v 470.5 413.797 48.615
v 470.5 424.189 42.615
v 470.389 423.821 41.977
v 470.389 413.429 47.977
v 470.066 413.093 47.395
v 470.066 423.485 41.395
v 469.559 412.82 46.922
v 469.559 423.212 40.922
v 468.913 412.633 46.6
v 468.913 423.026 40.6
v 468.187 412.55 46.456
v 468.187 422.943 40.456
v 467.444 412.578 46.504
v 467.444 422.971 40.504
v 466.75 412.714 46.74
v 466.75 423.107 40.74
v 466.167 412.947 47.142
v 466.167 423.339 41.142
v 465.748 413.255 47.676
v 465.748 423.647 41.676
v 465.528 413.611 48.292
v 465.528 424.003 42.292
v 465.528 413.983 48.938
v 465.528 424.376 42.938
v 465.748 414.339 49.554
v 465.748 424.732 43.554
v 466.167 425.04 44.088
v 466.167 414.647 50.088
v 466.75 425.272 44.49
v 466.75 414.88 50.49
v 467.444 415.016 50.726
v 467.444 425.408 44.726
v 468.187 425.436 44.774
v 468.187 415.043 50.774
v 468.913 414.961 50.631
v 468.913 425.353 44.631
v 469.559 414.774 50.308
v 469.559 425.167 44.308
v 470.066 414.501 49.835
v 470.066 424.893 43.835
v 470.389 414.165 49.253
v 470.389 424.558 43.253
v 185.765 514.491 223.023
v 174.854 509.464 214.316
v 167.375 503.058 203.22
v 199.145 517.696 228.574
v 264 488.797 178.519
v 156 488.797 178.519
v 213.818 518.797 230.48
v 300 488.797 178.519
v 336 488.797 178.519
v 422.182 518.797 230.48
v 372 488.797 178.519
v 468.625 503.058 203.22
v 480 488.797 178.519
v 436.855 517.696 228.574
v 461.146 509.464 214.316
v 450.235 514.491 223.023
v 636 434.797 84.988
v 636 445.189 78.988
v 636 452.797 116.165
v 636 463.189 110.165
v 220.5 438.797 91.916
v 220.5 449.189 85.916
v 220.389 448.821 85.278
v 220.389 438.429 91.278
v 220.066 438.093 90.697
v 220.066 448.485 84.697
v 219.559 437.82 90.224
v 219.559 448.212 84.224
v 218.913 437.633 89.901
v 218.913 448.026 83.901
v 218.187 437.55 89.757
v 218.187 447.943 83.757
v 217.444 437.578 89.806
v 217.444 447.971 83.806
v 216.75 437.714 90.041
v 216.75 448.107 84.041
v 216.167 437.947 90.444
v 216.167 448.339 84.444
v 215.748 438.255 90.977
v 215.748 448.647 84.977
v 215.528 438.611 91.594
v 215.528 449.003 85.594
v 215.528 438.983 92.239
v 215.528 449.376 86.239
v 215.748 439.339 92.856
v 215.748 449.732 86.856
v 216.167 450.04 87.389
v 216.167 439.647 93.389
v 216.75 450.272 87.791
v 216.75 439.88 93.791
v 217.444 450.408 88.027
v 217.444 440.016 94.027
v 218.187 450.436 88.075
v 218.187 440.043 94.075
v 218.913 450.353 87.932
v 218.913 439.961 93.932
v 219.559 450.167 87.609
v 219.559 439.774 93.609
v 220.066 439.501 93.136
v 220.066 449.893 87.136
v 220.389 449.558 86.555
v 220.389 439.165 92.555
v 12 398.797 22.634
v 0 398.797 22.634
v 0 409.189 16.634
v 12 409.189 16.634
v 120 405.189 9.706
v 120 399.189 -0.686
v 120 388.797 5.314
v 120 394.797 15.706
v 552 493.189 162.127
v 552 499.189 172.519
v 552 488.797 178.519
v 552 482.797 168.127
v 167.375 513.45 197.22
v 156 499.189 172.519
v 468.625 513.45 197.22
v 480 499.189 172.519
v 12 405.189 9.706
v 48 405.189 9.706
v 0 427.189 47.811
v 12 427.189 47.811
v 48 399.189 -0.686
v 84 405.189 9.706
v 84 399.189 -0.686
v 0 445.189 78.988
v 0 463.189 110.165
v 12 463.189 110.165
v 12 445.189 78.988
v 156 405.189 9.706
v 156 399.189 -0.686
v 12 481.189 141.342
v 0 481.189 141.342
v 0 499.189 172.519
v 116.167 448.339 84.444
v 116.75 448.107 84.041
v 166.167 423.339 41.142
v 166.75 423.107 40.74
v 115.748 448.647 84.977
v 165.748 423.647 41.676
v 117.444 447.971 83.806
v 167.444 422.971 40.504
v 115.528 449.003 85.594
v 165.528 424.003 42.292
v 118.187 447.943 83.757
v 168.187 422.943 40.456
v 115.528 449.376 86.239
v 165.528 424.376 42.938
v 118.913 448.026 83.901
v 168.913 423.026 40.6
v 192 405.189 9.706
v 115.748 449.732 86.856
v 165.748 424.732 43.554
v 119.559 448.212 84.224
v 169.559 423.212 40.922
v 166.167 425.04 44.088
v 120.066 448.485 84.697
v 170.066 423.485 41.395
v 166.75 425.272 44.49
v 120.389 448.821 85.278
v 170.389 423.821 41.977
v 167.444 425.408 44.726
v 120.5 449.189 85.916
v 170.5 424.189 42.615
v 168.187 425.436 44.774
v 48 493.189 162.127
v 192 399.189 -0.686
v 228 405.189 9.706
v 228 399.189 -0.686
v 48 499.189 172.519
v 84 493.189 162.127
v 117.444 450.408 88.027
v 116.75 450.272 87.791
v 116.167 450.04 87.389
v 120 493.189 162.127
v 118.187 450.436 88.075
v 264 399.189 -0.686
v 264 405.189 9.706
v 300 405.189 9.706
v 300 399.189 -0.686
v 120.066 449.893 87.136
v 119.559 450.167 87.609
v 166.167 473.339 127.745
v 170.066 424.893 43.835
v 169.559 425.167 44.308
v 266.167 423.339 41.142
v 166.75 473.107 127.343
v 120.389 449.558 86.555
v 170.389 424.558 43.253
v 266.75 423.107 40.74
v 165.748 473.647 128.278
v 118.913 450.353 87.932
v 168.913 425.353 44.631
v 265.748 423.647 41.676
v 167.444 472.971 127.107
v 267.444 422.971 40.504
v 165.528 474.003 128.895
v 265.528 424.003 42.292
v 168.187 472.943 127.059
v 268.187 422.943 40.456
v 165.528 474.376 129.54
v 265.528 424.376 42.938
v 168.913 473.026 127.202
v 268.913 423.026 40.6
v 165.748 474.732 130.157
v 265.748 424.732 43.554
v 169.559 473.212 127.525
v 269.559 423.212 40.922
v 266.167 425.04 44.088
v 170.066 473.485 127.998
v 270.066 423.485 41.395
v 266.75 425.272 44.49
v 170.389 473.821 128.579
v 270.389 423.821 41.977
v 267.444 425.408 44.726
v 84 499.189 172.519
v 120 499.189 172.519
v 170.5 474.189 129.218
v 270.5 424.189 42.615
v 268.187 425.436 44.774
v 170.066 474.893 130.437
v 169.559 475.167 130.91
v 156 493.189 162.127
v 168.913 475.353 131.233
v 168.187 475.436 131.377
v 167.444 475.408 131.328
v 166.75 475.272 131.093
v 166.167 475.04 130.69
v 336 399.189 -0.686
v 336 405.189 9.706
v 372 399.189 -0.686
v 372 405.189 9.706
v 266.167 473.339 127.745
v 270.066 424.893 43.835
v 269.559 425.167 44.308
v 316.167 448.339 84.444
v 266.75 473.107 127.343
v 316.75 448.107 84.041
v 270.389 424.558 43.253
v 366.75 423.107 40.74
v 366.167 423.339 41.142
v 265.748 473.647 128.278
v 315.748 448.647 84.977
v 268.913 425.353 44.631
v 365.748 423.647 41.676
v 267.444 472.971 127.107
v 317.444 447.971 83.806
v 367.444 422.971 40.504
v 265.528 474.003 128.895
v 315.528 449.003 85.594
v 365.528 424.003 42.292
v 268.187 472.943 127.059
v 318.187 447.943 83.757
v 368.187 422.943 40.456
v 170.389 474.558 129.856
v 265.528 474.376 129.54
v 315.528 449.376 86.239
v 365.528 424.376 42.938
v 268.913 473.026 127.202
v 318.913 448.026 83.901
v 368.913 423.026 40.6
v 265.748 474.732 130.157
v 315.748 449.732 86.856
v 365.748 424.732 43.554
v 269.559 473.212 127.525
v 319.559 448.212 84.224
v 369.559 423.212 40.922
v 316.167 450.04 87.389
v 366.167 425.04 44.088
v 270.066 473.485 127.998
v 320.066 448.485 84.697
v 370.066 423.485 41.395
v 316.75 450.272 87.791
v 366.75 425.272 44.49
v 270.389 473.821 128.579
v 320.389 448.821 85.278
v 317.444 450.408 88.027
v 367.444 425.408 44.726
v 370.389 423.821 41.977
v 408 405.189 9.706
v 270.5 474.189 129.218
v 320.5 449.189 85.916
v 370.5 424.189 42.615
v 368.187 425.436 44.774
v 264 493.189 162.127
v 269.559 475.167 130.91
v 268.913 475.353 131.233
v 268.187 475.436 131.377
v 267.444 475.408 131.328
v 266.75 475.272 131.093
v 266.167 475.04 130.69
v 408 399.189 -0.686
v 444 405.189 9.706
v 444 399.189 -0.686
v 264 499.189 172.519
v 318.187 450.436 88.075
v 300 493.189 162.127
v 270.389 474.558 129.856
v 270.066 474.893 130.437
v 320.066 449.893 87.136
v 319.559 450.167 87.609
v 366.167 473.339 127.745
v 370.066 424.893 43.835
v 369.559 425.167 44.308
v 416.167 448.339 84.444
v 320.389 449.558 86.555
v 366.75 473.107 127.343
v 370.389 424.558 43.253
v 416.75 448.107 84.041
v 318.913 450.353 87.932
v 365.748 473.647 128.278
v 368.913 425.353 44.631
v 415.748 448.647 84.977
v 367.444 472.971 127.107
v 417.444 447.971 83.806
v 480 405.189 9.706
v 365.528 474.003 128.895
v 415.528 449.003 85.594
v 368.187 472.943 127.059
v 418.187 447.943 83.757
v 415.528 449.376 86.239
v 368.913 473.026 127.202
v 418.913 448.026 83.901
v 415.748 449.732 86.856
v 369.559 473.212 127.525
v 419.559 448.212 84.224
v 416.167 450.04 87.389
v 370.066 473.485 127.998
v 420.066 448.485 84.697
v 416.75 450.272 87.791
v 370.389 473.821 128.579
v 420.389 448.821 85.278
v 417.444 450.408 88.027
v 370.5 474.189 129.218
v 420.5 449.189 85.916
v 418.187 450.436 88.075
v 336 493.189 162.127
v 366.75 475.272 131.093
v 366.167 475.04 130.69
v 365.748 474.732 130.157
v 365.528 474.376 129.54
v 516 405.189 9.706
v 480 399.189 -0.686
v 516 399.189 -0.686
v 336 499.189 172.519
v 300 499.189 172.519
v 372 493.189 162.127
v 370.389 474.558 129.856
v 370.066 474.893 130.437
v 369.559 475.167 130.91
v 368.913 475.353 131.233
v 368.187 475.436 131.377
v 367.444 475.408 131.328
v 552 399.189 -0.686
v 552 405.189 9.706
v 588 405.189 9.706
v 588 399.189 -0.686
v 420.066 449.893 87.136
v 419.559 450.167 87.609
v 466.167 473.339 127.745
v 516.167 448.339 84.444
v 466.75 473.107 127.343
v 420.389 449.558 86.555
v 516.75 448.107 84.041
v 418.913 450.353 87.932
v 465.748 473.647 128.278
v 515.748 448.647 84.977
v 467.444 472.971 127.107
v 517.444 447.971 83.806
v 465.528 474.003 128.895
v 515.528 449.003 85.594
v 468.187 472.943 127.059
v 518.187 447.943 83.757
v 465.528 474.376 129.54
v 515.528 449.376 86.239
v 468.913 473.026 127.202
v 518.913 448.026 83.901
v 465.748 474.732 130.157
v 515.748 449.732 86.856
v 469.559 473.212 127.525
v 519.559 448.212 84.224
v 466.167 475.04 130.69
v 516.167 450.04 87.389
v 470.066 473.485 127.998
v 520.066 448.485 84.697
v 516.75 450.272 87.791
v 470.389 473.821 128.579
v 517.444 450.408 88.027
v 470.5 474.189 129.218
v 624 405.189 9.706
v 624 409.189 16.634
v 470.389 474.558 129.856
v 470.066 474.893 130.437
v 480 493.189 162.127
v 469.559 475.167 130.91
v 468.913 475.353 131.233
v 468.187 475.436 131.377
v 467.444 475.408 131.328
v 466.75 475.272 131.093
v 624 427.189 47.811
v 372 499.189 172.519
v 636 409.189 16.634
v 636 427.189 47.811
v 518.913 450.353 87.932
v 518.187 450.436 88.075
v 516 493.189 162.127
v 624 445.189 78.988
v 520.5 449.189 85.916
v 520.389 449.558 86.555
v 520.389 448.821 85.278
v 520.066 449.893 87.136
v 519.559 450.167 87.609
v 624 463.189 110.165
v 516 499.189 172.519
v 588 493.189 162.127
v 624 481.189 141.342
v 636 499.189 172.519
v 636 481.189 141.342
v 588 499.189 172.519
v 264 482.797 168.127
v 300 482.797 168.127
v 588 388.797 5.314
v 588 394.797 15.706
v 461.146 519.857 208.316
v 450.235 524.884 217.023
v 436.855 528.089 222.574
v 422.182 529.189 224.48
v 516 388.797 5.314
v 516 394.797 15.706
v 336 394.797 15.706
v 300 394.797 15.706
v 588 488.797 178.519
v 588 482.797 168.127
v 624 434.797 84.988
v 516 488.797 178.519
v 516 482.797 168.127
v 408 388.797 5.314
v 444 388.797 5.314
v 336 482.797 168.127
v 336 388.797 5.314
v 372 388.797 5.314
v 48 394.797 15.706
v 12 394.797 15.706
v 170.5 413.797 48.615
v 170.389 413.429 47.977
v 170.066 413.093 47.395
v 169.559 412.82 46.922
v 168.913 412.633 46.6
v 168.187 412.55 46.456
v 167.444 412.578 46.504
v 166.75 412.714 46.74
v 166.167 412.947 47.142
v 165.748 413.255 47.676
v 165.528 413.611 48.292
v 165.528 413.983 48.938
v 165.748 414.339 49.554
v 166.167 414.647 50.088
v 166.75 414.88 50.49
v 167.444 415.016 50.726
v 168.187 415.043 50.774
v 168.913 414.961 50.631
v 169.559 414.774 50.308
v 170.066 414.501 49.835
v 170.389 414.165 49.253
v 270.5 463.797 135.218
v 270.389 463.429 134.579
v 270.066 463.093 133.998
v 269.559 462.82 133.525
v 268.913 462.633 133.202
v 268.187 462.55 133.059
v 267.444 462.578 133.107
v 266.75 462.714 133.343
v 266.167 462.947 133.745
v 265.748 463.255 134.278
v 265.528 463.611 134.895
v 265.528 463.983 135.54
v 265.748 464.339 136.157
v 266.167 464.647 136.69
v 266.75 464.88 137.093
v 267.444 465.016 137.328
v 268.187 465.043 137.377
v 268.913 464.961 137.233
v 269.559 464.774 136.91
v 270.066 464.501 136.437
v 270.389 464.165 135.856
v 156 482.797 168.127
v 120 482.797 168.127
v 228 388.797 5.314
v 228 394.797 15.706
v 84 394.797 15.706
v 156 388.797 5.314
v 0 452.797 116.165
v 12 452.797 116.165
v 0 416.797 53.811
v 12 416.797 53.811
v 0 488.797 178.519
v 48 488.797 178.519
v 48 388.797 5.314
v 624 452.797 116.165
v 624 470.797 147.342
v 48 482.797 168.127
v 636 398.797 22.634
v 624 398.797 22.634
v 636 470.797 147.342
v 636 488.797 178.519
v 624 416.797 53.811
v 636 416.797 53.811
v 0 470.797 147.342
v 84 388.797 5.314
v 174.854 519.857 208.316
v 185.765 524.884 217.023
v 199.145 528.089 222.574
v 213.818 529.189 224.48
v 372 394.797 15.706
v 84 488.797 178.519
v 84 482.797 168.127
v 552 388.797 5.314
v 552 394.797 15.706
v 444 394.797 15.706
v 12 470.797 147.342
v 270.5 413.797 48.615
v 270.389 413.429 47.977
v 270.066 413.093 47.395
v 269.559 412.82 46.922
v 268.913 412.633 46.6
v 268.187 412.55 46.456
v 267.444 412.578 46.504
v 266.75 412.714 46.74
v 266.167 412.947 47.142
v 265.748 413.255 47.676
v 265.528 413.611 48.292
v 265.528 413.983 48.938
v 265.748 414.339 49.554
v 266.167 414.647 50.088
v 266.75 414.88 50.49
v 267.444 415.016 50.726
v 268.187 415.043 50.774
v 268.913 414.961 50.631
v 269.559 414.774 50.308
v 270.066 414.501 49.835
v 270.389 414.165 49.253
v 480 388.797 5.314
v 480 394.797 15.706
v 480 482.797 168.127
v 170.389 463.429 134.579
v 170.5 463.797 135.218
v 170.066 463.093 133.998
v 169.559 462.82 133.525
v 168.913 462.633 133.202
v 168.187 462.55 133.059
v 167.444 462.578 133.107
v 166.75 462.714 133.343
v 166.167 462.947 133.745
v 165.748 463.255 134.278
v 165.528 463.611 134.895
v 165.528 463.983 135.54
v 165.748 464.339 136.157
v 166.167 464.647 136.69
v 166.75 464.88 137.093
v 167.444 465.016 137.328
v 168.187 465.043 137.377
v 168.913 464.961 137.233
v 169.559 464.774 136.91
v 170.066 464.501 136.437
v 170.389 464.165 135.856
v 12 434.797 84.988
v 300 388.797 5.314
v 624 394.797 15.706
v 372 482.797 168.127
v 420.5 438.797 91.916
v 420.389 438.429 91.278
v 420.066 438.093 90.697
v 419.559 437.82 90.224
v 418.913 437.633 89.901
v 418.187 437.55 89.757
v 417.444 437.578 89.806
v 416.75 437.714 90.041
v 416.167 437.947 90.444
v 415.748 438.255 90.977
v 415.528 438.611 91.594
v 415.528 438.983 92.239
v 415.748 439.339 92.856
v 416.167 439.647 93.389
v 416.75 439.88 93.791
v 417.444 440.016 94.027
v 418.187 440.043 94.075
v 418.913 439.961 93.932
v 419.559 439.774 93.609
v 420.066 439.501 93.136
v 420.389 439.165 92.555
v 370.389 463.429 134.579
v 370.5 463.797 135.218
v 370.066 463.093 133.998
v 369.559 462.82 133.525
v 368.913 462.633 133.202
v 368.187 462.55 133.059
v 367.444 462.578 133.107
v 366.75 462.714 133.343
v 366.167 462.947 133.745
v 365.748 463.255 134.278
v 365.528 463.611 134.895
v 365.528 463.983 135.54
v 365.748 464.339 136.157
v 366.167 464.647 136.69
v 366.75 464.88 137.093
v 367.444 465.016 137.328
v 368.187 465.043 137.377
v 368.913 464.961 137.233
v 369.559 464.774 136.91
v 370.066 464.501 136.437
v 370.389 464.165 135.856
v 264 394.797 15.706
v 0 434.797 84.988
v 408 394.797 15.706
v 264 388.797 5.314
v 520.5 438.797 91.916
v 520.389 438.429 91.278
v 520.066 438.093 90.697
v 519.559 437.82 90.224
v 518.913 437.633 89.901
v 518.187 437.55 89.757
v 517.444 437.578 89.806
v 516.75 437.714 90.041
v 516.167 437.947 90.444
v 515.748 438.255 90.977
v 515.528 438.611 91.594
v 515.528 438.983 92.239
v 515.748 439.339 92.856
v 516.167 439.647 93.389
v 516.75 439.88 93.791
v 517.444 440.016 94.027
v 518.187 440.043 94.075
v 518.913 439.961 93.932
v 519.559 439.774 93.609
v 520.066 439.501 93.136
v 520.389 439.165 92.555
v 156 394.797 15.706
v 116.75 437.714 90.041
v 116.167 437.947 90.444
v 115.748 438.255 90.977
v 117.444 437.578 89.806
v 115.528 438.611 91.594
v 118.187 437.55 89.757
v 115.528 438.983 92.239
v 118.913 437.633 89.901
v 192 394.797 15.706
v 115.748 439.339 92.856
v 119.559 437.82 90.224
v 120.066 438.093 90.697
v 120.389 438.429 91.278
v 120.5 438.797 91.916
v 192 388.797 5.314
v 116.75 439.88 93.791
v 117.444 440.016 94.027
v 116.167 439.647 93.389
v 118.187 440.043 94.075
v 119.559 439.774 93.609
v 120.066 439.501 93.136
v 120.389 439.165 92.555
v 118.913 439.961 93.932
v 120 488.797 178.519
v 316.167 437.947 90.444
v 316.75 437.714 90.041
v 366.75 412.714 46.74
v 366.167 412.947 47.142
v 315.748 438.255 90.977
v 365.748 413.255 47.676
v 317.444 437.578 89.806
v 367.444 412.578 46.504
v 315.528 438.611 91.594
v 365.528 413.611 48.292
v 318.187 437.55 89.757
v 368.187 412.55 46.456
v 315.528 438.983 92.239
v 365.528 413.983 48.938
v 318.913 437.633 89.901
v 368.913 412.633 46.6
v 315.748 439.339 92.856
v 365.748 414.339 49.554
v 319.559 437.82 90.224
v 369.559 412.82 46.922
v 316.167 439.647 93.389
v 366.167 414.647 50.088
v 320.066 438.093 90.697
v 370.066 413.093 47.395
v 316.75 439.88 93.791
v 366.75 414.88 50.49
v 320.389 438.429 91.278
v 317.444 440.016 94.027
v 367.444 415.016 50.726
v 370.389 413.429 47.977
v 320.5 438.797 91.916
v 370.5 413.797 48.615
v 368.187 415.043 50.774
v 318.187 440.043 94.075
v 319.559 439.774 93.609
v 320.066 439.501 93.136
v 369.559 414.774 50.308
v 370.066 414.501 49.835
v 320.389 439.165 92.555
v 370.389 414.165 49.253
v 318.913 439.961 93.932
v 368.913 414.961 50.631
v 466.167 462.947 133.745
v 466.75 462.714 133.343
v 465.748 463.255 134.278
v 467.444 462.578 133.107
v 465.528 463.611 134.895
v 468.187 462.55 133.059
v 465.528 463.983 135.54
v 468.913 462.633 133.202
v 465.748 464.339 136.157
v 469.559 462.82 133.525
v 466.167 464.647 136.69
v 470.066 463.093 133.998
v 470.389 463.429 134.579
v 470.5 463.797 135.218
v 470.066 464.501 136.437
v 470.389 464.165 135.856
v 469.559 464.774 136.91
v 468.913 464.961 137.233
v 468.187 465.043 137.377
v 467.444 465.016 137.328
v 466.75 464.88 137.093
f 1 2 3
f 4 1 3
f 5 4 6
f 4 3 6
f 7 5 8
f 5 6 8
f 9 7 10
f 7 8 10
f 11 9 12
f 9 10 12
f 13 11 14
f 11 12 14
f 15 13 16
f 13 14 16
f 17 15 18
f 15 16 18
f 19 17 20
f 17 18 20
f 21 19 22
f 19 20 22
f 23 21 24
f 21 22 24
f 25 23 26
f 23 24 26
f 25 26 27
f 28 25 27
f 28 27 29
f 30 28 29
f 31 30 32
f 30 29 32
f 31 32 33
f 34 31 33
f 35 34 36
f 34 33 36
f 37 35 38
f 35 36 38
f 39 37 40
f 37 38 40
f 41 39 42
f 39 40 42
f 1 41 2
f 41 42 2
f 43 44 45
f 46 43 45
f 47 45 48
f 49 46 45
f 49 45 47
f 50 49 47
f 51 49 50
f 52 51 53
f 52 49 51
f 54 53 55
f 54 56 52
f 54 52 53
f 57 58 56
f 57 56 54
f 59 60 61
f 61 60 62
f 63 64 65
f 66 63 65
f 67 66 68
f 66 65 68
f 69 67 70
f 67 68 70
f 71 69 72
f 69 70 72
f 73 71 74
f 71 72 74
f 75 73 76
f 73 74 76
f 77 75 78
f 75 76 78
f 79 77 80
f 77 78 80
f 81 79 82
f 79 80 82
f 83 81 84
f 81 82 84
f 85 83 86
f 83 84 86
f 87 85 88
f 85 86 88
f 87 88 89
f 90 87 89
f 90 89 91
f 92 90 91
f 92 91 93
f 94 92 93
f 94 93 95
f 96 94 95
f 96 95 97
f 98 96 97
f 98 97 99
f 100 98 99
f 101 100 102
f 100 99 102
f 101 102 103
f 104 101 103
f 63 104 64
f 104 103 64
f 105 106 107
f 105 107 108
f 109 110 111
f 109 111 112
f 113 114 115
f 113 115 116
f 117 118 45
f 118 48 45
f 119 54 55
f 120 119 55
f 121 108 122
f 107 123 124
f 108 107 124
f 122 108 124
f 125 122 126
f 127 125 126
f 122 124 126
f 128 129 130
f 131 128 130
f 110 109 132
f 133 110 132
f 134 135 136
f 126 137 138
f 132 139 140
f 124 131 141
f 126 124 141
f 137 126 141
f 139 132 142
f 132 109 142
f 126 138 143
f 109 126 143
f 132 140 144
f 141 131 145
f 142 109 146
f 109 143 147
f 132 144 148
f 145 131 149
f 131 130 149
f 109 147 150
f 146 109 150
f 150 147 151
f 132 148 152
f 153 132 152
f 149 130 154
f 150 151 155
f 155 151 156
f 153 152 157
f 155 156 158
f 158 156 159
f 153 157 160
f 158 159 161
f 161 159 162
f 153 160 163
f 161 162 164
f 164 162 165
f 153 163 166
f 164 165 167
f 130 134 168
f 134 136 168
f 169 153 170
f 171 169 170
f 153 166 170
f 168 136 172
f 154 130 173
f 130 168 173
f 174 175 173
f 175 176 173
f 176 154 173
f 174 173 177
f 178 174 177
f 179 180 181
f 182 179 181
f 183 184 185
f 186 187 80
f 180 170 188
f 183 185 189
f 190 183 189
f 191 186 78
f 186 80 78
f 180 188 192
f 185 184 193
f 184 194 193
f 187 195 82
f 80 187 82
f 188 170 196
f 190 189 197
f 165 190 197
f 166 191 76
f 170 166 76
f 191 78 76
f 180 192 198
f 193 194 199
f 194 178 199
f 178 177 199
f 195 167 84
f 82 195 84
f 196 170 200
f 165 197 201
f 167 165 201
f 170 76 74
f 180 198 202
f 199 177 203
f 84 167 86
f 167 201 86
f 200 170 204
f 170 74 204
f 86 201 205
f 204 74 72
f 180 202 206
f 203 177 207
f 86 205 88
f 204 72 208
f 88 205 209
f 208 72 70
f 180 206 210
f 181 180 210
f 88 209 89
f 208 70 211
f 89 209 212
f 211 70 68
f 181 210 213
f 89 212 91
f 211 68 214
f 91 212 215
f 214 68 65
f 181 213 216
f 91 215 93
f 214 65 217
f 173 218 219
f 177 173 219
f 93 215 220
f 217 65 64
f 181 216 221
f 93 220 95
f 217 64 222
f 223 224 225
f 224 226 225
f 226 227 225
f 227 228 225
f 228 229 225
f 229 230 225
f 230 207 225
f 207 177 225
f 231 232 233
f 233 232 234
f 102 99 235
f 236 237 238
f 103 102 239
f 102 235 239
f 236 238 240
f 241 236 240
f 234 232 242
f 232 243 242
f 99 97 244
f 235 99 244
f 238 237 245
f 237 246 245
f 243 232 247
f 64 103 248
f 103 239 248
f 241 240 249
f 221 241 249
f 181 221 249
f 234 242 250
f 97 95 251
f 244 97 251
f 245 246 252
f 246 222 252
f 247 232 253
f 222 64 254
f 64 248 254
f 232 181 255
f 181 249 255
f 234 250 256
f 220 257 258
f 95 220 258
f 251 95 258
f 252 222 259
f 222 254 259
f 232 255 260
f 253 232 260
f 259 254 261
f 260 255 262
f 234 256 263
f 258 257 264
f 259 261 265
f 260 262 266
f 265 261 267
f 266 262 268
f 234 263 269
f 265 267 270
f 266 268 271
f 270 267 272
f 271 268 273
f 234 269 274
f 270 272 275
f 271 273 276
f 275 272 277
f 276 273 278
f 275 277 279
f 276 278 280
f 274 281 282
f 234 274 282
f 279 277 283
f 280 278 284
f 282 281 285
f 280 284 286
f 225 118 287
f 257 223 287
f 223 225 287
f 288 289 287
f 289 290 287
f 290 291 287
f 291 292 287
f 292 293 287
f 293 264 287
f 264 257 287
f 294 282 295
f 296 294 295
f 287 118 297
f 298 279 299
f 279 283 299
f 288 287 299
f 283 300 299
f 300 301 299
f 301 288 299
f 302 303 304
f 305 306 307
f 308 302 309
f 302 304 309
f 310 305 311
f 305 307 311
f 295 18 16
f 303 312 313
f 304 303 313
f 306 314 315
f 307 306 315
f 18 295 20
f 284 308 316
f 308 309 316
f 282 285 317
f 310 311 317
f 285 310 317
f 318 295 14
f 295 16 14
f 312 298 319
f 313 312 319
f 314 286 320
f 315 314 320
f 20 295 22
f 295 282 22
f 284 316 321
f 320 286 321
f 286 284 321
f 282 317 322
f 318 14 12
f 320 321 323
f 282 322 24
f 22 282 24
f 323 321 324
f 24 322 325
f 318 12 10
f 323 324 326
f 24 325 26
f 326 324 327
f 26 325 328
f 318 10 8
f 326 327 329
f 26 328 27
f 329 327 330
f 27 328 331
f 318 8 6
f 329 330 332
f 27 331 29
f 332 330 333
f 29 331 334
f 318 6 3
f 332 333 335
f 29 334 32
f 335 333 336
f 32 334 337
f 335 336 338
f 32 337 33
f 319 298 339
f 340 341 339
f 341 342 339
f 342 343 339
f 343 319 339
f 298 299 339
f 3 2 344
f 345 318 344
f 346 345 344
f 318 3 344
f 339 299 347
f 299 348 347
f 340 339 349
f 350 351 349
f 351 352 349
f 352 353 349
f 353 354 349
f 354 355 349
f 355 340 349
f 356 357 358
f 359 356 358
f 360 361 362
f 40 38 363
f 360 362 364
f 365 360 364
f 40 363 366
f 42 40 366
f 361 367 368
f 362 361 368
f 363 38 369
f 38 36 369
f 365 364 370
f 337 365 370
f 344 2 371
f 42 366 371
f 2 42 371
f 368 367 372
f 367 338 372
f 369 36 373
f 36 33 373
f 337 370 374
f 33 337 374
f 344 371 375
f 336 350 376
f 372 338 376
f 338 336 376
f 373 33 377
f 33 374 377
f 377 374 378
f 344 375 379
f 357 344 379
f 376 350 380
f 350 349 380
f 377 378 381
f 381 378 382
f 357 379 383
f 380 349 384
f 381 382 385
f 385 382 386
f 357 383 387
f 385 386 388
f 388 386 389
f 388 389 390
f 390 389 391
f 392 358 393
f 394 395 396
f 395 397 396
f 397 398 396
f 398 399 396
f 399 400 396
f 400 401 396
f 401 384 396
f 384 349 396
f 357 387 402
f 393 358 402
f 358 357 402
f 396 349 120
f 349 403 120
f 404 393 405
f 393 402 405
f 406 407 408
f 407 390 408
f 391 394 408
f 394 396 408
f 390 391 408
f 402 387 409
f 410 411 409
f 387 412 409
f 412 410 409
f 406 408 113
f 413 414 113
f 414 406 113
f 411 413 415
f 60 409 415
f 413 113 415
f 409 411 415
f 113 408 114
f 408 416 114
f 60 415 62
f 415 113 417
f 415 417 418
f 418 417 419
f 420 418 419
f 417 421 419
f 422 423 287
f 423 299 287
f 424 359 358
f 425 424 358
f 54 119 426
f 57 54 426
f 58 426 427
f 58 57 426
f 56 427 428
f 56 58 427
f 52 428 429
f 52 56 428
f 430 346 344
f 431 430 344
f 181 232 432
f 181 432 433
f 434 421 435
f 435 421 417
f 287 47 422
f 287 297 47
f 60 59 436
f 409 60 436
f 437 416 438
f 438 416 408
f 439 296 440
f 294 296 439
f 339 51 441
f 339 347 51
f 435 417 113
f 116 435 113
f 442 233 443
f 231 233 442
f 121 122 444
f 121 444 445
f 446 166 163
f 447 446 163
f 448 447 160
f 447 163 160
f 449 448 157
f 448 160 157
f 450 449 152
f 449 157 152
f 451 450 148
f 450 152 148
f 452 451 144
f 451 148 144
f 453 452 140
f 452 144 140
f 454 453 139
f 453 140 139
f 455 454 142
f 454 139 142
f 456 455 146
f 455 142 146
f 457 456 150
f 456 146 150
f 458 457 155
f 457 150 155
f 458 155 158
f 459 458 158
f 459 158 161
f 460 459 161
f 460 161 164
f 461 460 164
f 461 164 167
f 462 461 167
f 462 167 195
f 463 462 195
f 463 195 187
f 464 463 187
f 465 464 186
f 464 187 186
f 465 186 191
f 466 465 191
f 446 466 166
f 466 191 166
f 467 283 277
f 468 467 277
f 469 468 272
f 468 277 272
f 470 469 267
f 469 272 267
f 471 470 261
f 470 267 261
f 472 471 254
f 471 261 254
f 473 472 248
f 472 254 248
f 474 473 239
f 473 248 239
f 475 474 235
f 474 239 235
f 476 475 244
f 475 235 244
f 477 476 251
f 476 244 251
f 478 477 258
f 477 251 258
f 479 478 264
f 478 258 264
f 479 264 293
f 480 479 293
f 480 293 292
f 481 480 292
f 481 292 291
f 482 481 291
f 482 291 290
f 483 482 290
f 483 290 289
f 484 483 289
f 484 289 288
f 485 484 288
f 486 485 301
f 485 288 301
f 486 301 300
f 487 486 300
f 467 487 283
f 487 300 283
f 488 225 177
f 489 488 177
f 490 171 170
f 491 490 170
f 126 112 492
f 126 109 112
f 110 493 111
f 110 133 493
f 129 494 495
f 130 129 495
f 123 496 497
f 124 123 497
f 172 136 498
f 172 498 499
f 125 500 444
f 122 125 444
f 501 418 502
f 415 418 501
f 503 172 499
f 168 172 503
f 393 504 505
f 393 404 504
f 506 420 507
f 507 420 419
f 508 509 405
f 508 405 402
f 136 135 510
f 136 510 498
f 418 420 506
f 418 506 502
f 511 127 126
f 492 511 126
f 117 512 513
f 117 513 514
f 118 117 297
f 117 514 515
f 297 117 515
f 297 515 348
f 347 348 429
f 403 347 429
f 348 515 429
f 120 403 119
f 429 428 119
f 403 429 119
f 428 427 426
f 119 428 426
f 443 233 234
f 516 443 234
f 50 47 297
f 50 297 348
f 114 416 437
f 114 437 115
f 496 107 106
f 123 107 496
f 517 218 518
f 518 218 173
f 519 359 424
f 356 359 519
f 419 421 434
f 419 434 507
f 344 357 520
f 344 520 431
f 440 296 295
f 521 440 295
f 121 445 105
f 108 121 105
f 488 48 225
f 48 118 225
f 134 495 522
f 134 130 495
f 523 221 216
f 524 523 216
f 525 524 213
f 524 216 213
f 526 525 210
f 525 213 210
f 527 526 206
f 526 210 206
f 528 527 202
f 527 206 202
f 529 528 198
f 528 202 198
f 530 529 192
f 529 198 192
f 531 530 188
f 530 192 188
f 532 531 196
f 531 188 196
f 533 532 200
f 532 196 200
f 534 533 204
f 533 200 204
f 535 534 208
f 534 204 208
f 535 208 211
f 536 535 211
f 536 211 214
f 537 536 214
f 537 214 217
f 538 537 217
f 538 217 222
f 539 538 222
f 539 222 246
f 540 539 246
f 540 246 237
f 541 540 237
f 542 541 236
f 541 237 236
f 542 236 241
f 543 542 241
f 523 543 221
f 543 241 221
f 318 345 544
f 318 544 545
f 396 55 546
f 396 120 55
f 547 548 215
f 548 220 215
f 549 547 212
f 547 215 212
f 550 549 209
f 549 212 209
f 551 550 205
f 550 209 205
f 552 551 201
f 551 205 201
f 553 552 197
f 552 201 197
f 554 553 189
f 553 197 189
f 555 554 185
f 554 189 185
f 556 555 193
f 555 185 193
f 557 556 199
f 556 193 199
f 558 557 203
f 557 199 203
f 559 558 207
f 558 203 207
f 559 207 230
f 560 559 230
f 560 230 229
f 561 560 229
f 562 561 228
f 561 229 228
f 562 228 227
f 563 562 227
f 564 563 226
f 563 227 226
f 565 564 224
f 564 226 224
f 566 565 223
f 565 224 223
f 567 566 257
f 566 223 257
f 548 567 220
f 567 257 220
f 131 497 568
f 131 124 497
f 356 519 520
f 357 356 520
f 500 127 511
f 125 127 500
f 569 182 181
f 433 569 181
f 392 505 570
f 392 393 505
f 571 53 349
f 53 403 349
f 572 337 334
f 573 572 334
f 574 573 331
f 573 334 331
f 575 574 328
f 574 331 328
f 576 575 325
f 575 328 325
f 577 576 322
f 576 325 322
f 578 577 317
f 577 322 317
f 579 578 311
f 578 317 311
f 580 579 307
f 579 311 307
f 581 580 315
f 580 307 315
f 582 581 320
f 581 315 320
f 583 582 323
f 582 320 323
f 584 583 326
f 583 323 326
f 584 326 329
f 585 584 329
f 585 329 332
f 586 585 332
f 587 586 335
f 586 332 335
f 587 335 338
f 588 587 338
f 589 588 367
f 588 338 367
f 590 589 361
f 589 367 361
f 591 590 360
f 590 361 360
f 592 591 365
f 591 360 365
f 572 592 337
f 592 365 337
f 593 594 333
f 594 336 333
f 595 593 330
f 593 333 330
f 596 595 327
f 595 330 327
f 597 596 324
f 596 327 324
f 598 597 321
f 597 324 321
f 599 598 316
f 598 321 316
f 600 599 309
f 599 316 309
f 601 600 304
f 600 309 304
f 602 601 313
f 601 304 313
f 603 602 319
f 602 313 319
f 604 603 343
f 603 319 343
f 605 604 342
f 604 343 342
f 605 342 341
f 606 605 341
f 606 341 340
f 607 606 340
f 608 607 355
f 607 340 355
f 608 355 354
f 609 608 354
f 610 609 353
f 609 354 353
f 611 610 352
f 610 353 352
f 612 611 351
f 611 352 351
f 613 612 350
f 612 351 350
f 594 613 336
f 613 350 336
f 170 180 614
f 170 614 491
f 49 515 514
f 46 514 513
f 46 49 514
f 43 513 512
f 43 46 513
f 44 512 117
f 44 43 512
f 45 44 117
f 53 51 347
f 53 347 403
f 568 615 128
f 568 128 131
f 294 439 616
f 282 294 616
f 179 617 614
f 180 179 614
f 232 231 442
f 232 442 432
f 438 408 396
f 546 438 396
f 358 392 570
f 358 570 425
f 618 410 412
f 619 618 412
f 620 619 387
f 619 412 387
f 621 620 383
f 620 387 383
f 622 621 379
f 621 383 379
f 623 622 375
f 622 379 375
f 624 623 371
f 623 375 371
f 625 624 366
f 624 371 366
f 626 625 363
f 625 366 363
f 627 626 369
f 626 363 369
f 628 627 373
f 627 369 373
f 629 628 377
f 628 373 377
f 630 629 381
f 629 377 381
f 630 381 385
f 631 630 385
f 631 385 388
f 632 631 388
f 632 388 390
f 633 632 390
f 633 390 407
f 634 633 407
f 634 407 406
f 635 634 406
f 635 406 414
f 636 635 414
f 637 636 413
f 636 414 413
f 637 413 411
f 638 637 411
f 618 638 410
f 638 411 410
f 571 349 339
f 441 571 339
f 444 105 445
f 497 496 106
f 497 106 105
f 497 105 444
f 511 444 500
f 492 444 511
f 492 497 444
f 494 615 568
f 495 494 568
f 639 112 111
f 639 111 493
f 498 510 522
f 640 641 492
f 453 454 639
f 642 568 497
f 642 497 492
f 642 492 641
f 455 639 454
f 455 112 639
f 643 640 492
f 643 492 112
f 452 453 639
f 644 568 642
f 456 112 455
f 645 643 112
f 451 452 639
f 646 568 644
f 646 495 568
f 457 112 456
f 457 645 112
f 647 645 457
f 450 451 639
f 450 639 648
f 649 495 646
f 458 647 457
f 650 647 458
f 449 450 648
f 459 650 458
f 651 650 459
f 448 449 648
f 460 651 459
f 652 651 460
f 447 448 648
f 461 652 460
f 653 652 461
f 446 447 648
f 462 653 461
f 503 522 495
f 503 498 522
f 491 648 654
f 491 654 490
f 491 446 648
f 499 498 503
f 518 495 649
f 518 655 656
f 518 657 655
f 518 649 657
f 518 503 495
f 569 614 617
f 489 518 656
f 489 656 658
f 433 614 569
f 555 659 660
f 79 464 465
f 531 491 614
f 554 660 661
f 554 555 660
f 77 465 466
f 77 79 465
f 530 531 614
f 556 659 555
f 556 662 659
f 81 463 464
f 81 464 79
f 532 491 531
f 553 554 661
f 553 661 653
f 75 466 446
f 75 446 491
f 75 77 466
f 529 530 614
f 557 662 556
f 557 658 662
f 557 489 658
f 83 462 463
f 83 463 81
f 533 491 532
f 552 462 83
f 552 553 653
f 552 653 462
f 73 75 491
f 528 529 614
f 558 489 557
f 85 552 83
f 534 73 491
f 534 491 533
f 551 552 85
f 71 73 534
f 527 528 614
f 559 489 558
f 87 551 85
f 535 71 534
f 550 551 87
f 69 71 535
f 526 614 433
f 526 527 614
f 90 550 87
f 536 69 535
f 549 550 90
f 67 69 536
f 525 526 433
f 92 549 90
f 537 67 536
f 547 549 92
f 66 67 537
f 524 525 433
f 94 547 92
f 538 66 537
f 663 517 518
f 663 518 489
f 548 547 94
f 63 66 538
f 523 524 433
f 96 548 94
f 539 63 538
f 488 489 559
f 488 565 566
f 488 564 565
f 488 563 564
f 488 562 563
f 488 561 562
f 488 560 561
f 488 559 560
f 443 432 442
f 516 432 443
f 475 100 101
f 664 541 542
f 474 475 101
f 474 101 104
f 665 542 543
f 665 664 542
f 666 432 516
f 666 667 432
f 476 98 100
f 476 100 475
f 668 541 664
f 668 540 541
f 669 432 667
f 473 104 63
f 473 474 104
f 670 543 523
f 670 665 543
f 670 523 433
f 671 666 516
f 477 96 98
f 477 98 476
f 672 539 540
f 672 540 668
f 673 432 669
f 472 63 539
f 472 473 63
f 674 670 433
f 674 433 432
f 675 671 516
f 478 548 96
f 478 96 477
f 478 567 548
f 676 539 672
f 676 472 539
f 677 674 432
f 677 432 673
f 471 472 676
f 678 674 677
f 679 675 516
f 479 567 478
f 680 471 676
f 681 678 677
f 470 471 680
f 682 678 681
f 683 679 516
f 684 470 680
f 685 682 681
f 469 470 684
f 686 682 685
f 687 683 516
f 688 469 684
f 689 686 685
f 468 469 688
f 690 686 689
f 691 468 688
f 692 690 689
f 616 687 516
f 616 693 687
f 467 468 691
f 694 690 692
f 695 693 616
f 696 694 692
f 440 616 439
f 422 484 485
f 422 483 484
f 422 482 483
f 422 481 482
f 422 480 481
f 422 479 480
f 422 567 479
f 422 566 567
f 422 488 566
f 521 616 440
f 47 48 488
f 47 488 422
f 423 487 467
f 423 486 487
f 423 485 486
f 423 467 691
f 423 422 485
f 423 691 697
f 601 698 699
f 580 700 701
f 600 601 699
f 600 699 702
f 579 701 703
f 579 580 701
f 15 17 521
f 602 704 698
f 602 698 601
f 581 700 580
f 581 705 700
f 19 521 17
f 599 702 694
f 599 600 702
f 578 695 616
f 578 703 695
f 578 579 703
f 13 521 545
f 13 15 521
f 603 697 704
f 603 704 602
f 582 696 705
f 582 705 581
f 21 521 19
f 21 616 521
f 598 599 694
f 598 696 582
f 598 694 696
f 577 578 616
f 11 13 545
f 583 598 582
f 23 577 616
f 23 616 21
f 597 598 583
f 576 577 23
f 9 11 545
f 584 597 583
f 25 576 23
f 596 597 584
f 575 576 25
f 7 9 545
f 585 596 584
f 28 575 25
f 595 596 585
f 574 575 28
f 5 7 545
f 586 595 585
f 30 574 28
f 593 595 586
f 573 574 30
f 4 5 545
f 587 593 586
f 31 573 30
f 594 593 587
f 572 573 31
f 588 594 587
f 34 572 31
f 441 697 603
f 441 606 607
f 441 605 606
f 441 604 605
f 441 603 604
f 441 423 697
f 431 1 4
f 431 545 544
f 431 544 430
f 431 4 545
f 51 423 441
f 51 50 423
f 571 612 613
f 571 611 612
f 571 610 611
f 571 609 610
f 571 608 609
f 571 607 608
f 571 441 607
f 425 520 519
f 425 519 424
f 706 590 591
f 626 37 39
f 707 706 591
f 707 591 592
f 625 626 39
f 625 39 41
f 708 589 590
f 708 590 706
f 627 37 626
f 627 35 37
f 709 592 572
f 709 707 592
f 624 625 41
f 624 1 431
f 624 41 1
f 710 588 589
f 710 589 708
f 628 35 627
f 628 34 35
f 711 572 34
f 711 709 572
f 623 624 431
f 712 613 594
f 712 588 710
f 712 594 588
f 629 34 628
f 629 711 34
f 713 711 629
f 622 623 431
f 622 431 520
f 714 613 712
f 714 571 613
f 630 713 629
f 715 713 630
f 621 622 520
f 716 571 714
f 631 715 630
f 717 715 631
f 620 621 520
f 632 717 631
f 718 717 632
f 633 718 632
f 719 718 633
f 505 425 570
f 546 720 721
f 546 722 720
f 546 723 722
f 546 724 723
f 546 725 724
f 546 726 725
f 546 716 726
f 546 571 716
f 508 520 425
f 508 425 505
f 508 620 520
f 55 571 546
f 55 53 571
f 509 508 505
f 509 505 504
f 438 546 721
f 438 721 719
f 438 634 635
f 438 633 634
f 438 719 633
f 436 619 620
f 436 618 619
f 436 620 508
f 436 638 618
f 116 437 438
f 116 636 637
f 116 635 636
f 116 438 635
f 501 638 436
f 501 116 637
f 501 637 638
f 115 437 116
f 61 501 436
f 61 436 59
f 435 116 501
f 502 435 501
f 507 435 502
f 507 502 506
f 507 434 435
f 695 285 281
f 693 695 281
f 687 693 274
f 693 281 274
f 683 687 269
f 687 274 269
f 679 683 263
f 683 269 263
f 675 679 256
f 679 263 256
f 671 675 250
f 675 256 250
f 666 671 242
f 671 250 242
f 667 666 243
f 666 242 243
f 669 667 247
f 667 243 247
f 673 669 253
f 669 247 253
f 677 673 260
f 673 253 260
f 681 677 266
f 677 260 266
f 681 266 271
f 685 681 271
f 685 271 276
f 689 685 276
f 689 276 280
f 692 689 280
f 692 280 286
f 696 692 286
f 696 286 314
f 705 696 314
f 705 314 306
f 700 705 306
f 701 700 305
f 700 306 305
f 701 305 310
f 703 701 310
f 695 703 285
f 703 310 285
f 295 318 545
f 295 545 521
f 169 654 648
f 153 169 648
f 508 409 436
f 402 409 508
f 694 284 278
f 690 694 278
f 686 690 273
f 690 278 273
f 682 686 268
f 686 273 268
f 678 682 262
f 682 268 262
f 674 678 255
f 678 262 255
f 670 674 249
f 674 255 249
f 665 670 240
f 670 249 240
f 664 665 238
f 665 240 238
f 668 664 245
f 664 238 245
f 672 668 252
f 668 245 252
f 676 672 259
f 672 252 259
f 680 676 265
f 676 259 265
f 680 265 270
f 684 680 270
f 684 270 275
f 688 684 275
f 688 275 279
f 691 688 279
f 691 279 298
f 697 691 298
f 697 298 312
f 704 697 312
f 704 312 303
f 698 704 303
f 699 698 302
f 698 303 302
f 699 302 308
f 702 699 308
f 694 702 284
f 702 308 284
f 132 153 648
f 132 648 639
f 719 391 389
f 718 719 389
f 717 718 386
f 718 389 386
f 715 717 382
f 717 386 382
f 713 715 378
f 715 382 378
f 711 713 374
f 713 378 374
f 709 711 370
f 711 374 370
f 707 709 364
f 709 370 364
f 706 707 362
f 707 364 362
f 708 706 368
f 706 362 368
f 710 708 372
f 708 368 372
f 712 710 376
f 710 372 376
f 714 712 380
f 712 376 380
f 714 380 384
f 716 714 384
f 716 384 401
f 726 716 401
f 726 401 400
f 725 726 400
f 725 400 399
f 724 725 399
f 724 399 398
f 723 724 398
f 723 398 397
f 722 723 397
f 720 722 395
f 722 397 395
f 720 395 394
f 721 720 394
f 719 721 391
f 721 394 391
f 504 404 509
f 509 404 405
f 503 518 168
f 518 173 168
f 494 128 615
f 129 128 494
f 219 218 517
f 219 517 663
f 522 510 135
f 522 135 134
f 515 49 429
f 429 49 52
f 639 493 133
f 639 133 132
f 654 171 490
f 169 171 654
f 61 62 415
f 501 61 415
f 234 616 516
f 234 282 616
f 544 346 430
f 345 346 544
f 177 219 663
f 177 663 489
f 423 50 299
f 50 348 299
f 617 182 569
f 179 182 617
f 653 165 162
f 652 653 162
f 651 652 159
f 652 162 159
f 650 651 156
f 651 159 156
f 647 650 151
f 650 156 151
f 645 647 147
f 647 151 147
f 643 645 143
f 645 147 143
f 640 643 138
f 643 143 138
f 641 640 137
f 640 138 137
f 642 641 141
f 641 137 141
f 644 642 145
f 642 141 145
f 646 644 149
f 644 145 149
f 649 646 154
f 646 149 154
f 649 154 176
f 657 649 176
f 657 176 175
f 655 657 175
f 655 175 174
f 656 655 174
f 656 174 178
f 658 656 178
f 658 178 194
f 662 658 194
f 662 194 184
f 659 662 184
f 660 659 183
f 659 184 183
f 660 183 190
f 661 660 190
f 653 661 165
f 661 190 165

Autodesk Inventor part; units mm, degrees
ref_plane "YZ Plane" through (0, 0, 0) normal (1, 0, 0) x (0, 1, 0)
ref_plane "XZ Plane" through (0, 0, 0) normal (0, 1, 0) x (-1, 0, 0)
ref_plane "XY Plane" through (0, 0, 0) normal (0, 0, 1) x (1, 0, 0)
ref_plane "Work Plane2" through (0, 481.1893, 141.342) normal (0, -0.866, 0.5) x (1, 0, 0)
sketch "Sketch2" plane through (0, 481.1893, 141.342) normal (0, -0.866, 0.5) x (1, 0, 0)
  line L0 (0, 0) -> (0, 36) projected
  line L1 (0, 0) -> (12, 0) projected
  line L2 (12, 36) -> (12, 0) projected
  line L3 (0, 36) -> (12, 36) projected
  line L4 (0, -72) -> (0, -36) projected
  line L5 (0, -72) -> (12, -72) projected
  line L6 (12, -36) -> (12, -72) projected
  line L7 (0, -36) -> (12, -36) projected
  line L8 (0, -144) -> (0, -108) projected
  line L9 (0, -144) -> (12, -144) projected
  line L10 (12, -108) -> (12, -144) projected
  line L11 (0, -108) -> (12, -108) projected
  line L12 (48, -147.6081) -> (12, -147.6081) projected
  line L13 (12, 36) -> (624, 36)
  line L14 (624, 36) -> (624, -164)
  line L15 (624, -164) -> (12, -164)
  line L16 (12, -164) -> (12, 36)
  line L17 (318, -164) -> (318, 36) construction
  line L18 (636, 0) -> (636, 36)
  line L19 (636, 0) -> (624, 0)
  line L20 (624, 36) -> (624, 0)
  line L21 (636, 36) -> (624, 36)
  line L22 (636, -72) -> (636, -36)
  line L23 (636, -72) -> (624, -72)
  line L24 (624, -36) -> (624, -72)
  line L25 (636, -36) -> (624, -36)
  line L26 (636, -144) -> (636, -108)
  line L27 (636, -144) -> (624, -144)
  line L28 (624, -108) -> (624, -144)
  line L29 (636, -108) -> (624, -108)
  line L30 (588, -147.6081) -> (624, -147.6081)
  line L31 (624, -164) -> (624, 36)
  line L32 (12, 36) -> (48, 36)
  line L33 (48, 36) -> (48, 24)
  line L34 (48, 24) -> (12, 24)
  line L35 (12, 24) -> (12, 36)
  line L36 (84, 24) -> (48, 24)
  line L37 (84, 36) -> (84, 24)
  line L38 (48, 36) -> (84, 36)
  line L39 (48, 24) -> (48, 36)
  line L40 (120, 24) -> (84, 24)
  line L41 (120, 36) -> (120, 24)
  line L42 (84, 36) -> (120, 36)
  line L43 (84, 24) -> (84, 36)
  line L44 (156, 24) -> (120, 24)
  line L45 (156, 36) -> (156, 24)
  line L46 (120, 36) -> (156, 36)
  line L47 (120, 24) -> (120, 36)
  line L48 (192, 24) -> (156, 24)
  line L49 (192, 36) -> (192, 24)
  line L50 (156, 36) -> (192, 36)
  line L51 (156, 24) -> (156, 36)
  line L52 (228, 24) -> (192, 24)
  line L53 (228, 36) -> (228, 24)
  line L54 (192, 36) -> (228, 36)
  line L55 (192, 24) -> (192, 36)
  line L56 (264, 24) -> (228, 24)
  line L57 (264, 36) -> (264, 24)
  line L58 (228, 36) -> (264, 36)
  line L59 (228, 24) -> (228, 36)
  line L60 (300, 24) -> (264, 24)
  line L61 (300, 36) -> (300, 24)
  line L62 (264, 36) -> (300, 36)
  line L63 (264, 24) -> (264, 36)
  line L64 (336, 24) -> (300, 24)
  line L65 (336, 36) -> (336, 24)
  line L66 (300, 36) -> (336, 36)
  line L67 (300, 24) -> (300, 36)
  line L68 (372, 24) -> (336, 24)
  line L69 (372, 36) -> (372, 24)
  line L70 (336, 36) -> (372, 36)
  line L71 (336, 24) -> (336, 36)
  line L72 (408, 24) -> (372, 24)
  line L73 (408, 36) -> (408, 24)
  line L74 (372, 36) -> (408, 36)
  line L75 (372, 24) -> (372, 36)
  line L76 (444, 24) -> (408, 24)
  line L77 (444, 36) -> (444, 24)
  line L78 (408, 36) -> (444, 36)
  line L79 (408, 24) -> (408, 36)
  line L80 (480, 24) -> (444, 24)
  line L81 (480, 36) -> (480, 24)
  line L82 (444, 36) -> (480, 36)
  line L83 (444, 24) -> (444, 36)
  line L84 (516, 24) -> (480, 24)
  line L85 (516, 36) -> (516, 24)
  line L86 (480, 36) -> (516, 36)
  line L87 (480, 24) -> (480, 36)
  line L88 (552, 24) -> (516, 24)
  line L89 (552, 36) -> (552, 24)
  line L90 (516, 36) -> (552, 36)
  line L91 (516, 24) -> (516, 36)
  line L92 (588, 24) -> (552, 24)
  line L93 (588, 36) -> (588, 24)
  line L94 (552, 36) -> (588, 36)
  line L95 (552, 24) -> (552, 36)
  line L96 (624, 24) -> (588, 24)
  line L97 (624, 36) -> (624, 24)
  line L98 (588, 36) -> (624, 36)
  line L99 (588, 24) -> (588, 36)
  line L100 (660, 24) -> (624, 24)
  line L101 (660, 36) -> (660, 24)
  line L102 (624, 36) -> (660, 36)
  line L103 (624, 24) -> (624, 36)
  line L104 (696, 24) -> (660, 24)
  line L105 (696, 36) -> (696, 24)
  line L106 (660, 36) -> (696, 36)
  line L107 (660, 24) -> (660, 36)
  line L108 (732, 24) -> (696, 24)
  line L109 (732, 36) -> (732, 24)
  line L110 (696, 36) -> (732, 36)
  line L111 (696, 24) -> (696, 36)
  line L112 (12, -64) -> (624, -64) construction
  line L113 (12, -164) -> (12, -128)
  line L114 (12, -164) -> (624, -164)
  line L115 (12, -164) -> (48, -164)
  line L116 (48, -164) -> (48, -152)
  line L117 (48, -152) -> (12, -152)
  line L118 (12, -152) -> (12, -164)
  line L119 (84, -152) -> (48, -152)
  line L120 (84, -164) -> (84, -152)
  line L121 (48, -164) -> (84, -164)
  line L122 (48, -152) -> (48, -164)
  line L123 (120, -152) -> (84, -152)
  line L124 (120, -164) -> (120, -152)
  line L125 (84, -164) -> (120, -164)
  line L126 (84, -152) -> (84, -164)
  line L127 (156, -152) -> (120, -152)
  line L128 (156, -164) -> (156, -152)
  line L129 (120, -164) -> (156, -164)
  line L130 (120, -152) -> (120, -164)
  line L131 (192, -152) -> (156, -152)
  line L132 (192, -164) -> (192, -152)
  line L133 (156, -164) -> (192, -164)
  line L134 (156, -152) -> (156, -164)
  line L135 (228, -152) -> (192, -152)
  line L136 (228, -164) -> (228, -152)
  line L137 (192, -164) -> (228, -164)
  line L138 (192, -152) -> (192, -164)
  line L139 (264, -152) -> (228, -152)
  line L140 (264, -164) -> (264, -152)
  line L141 (228, -164) -> (264, -164)
  line L142 (228, -152) -> (228, -164)
  line L143 (300, -152) -> (264, -152)
  line L144 (300, -164) -> (300, -152)
  line L145 (264, -164) -> (300, -164)
  line L146 (264, -152) -> (264, -164)
  line L147 (336, -152) -> (300, -152)
  line L148 (336, -164) -> (336, -152)
  line L149 (300, -164) -> (336, -164)
  line L150 (300, -152) -> (300, -164)
  line L151 (372, -152) -> (336, -152)
  line L152 (372, -164) -> (372, -152)
  line L153 (336, -164) -> (372, -164)
  line L154 (336, -152) -> (336, -164)
  line L155 (408, -152) -> (372, -152)
  line L156 (408, -164) -> (408, -152)
  line L157 (372, -164) -> (408, -164)
  line L158 (372, -152) -> (372, -164)
  line L159 (444, -152) -> (408, -152)
  line L160 (444, -164) -> (444, -152)
  line L161 (408, -164) -> (444, -164)
  line L162 (408, -152) -> (408, -164)
  line L163 (480, -152) -> (444, -152)
  line L164 (480, -164) -> (480, -152)
  line L165 (444, -164) -> (480, -164)
  line L166 (444, -152) -> (444, -164)
  line L167 (516, -152) -> (480, -152)
  line L168 (516, -164) -> (516, -152)
  line L169 (480, -164) -> (516, -164)
  line L170 (480, -152) -> (480, -164)
  line L171 (552, -152) -> (516, -152)
  line L172 (552, -164) -> (552, -152)
  line L173 (516, -164) -> (552, -164)
  line L174 (516, -152) -> (516, -164)
  line L175 (588, -152) -> (552, -152)
  line L176 (588, -164) -> (588, -152)
  line L177 (552, -164) -> (588, -164)
  line L178 (552, -152) -> (552, -164)
  line L179 (624, -152) -> (588, -152)
  line L180 (624, -164) -> (624, -152)
  line L181 (588, -164) -> (624, -164)
  line L182 (588, -152) -> (588, -164)
  line L183 (624, -152) -> (624, -164)
  circle A0 centre (318, -64) radius 2.5
  circle A1 centre (218, -64) radius 2.5
  circle A2 centre (118, -64) radius 2.5
  line L184 (624, -64) -> (12, -64) construction
  circle A3 centre (318, -64) radius 2.5
  circle A4 centre (418, -64) radius 2.5
  circle A5 centre (518, -64) radius 2.5
  circle A6 centre (168, -14) radius 2.5
  circle A7 centre (268, -14) radius 2.5
  circle A8 centre (468, -14) radius 2.5
  circle A9 centre (368, -14) radius 2.5
  line L185 (318, 36) -> (318, -164) construction
  circle A10 centre (168, -114) radius 2.5
  circle A11 centre (268, -114) radius 2.5
  circle A12 centre (468, -114) radius 2.5
  circle A13 centre (368, -114) radius 2.5
  point P0 (0, -363.0004)
  point P1 (48, 24)
  point P2 (12, 0)
  point P3 (12, -72)
  point P4 (12, -108)
  point P5 (12, -144)
  point P6 (12, -152)
  point P7 (48, -164)
  point P8 (84, -164)
  point P9 (84, -152)
  point P10 (120, -164)
  point P11 (156, -164)
  point P12 (156, -152)
  point P13 (192, -164)
  point P14 (228, -164)
  point P15 (228, -152)
  point P16 (264, -164)
  point P17 (300, -164)
  point P18 (300, -152)
  point P19 (336, -164)
  point P20 (372, -164)
  point P21 (372, -152)
  point P22 (408, -164)
  point P23 (444, -164)
  point P24 (444, -152)
  point P25 (480, -164)
  point P26 (516, -164)
  point P27 (516, -152)
  point P28 (552, -164)
  point P29 (588, -164)
  point P30 (624, -144)
  point P31 (624, -108)
  point P32 (624, -72)
  point P33 (624, -36)
  point P34 (624, 0)
  point P35 (552, 24)
  point P36 (552, 36)
  point P37 (516, 36)
  point P38 (480, 24)
  point P39 (480, 36)
  point P40 (444, 36)
  point P41 (408, 36)
  point P42 (372, 36)
  point P43 (336, 24)
  point P44 (336, 36)
  point P45 (300, 36)
  point P46 (264, 24)
  point P47 (264, 36)
  point P48 (228, 36)
  point P49 (192, 24)
  point P50 (192, 36)
  point P51 (156, 36)
  point P52 (120, 24)
  point P53 (120, 36)
  point P54 (84, 36)
  dimension "d4" = 612
  dimension "d5" = 200
  dimension "d6" = 12
  dimension "d7" = 36
  dimension "d10" = 36
  dimension "d21" = 5
  dimension "d24" = 100
  dimension "d29" = 5
  dimension "d30" = 5
  dimension "d31" = 100
  dimension "d32" = 50
  dimension "d33" = 50
extrude "Extrusion2" add sketch "Sketch2" along normal blind 12 contours L0 L3 L2 L1 | L2 L34 L36 L40 L44 L48 L52 L56 L60 L64 L68 L72 L76 L80 L84 L88 L92 L96 L14 L179 L175 L171 L167 L163 L159 L155 L151 L147 L143 L139 L135 L131 L127 L123 L119 L117 L16 L10 L6 | L13 L33 L34 L2 | L6 L5 L4 L7 | L13 L41 L40 L37 | L10 L9 L8 L11 | L13 L49 L48 L45 | L13 L53 L52 L49 | L13 L57 L56 L53 | L119 L120 L15 L116 | L13 L65 L64 L61 | L127 L128 L15 L124 | L13 L73 L72 L69 | L13 L77 L76 L73 | L135 L136 L15 L132 | L13 L81 L80 L77 | L143 L144 L15 L140 | L13 L89 L88 L85 | L151 L152 L15 L148 | L13 L14 L96 L93 | L21 L18 L100 L14 | L100 L18 L19 L14 | L159 L160 L15 L156 | L25 L22 L23 L14 | L167 L168 L15 L164 | L29 L26 L27 L14 | L175 L176 L15 L172
sketch "Sketch3" plane through (0, 470.797, 147.342) normal (0, -0.866, 0.5) x (1, 0, 0)
  line L0 (588, -164) -> (588, -152) projected
  line L1 (588, -152) -> (624, -152) projected
  line L2 (624, -152) -> (624, -144) projected
  line L3 (624, -144) -> (636, -144) projected
  line L4 (636, -144) -> (636, -108) projected
  line L5 (636, -108) -> (624, -108) projected
  line L6 (624, -108) -> (624, -72) projected
  line L7 (624, -72) -> (636, -72) projected
  line L8 (636, -72) -> (636, -36) projected
  line L9 (636, -36) -> (624, -36) projected
  line L10 (624, -36) -> (624, 0) projected
  line L11 (624, 0) -> (636, 0) projected
  line L12 (636, 0) -> (636, 36) projected
  line L13 (636, 36) -> (588, 36) projected
  line L14 (588, 36) -> (588, 24) projected
  line L15 (588, 24) -> (552, 24) projected
  line L16 (552, 24) -> (552, 36) projected
  line L17 (552, 36) -> (516, 36) projected
  line L18 (516, 36) -> (516, 24) projected
  line L19 (516, 24) -> (480, 24) projected
  line L20 (480, 24) -> (480, 36) projected
  line L21 (264, 36) -> (156, 36) projected
  line L22 (480, 36) -> (372, 36) projected
  line L23 (372, 36) -> (372, 24) projected
  line L24 (372, 24) -> (336, 24) projected
  line L25 (336, 24) -> (336, 36) projected
  line L26 (336, 36) -> (300, 36) projected
  line L27 (300, 36) -> (300, 24) projected
  line L28 (300, 24) -> (264, 24) projected
  line L29 (264, 24) -> (264, 36) projected
  line L30 (156, 36) -> (156, 24) projected
  line L31 (156, 24) -> (120, 24) projected
  line L32 (120, 24) -> (120, 36) projected
  line L33 (120, 36) -> (84, 36) projected
  line L34 (84, 36) -> (84, 24) projected
  line L35 (84, 24) -> (48, 24) projected
  line L36 (48, 24) -> (48, 36) projected
  line L37 (48, 36) -> (0, 36) projected
  line L38 (0, 36) -> (0, 0) projected
  line L39 (0, 0) -> (12, 0) projected
  line L40 (12, 0) -> (12, -36) projected
  line L41 (12, -36) -> (0, -36) projected
  line L42 (0, -36) -> (0, -72) projected
  line L43 (0, -72) -> (12, -72) projected
  line L44 (12, -72) -> (12, -108) projected
  line L45 (12, -108) -> (0, -108) projected
  line L46 (0, -108) -> (0, -144) projected
  line L47 (0, -144) -> (12, -144) projected
  line L48 (12, -144) -> (12, -152) projected
  line L49 (12, -152) -> (48, -152) projected
  line L50 (48, -152) -> (48, -164) projected
  line L51 (48, -164) -> (84, -164) projected
  line L52 (84, -164) -> (84, -152) projected
  line L53 (84, -152) -> (120, -152) projected
  line L54 (120, -152) -> (120, -164) projected
  line L55 (120, -164) -> (156, -164) projected
  line L56 (156, -164) -> (156, -152) projected
  line L57 (156, -152) -> (192, -152) projected
  line L58 (192, -152) -> (192, -164) projected
  line L59 (192, -164) -> (228, -164) projected
  line L60 (228, -164) -> (228, -152) projected
  line L61 (228, -152) -> (264, -152) projected
  line L62 (264, -152) -> (264, -164) projected
  line L63 (264, -164) -> (300, -164) projected
  line L64 (300, -164) -> (300, -152) projected
  line L65 (300, -152) -> (336, -152) projected
  line L66 (336, -152) -> (336, -164) projected
  line L67 (336, -164) -> (372, -164) projected
  line L68 (372, -164) -> (372, -152) projected
  line L69 (372, -152) -> (408, -152) projected
  line L70 (408, -152) -> (408, -164) projected
  line L71 (408, -164) -> (444, -164) projected
  line L72 (444, -164) -> (444, -152) projected
  line L73 (444, -152) -> (480, -152) projected
  line L74 (480, -152) -> (480, -164) projected
  line L75 (480, -164) -> (516, -164) projected
  line L76 (516, -164) -> (516, -152) projected
  line L77 (516, -152) -> (552, -152) projected
  line L78 (552, -152) -> (552, -164) projected
  line L79 (552, -164) -> (588, -164) projected
  line L80 (156, 36) -> (167.3747, 64.5218)
  line L81 (213.8176, 96) -> (422.1824, 96)
  line L82 (468.6253, 64.5218) -> (480, 36)
  arc A0 (213.8176, 96) -> (167.3747, 64.5218) centre (213.8176, 46) ccw
  arc A1 (468.6253, 64.5218) -> (422.1824, 96) centre (422.1824, 46) ccw
  line L83 (336, 36) -> (300, 36) projected
  line L84 (156, 36) -> (480, 36)
  point P0 (0, -363.0004)
  point P1 (300, 36)
  dimension "d17" = 50
  dimension "d20" = 60
extrude "Extrusion3" add sketch "Sketch3" against normal blind 12 contours L22 L84 L26 L21 L80 A0 L81 A1 L82
sketch "Sketch5" plane through (0, 481.1893, 141.342) normal (0, 0.866, -0.5) x (1, 0, 0)
  line L0 (264, -24) -> (264, -36) projected
  line L1 (300, -24) -> (264, -24) projected
  line L2 (300, -36) -> (300, -24) projected
  line L3 (300, -36) -> (264, -36) projected
  line L4 (336, -24) -> (336, -36) projected
  line L5 (372, -24) -> (336, -24) projected
  line L6 (372, -36) -> (372, -24) projected
  line L7 (372, -36) -> (336, -36) projected
  line L8 (156, -36) -> (167.3747, -64.5218) projected
  arc A0 (167.3747, -64.5218) -> (213.8176, -96) centre (213.8176, -46) ccw projected
  line L9 (213.8176, -96) -> (422.1824, -96) projected
  arc A1 (422.1824, -96) -> (468.6253, -64.5218) centre (422.1824, -46) ccw projected
  line L10 (468.6253, -64.5218) -> (480, -36) projected
  line L11 (480, -24) -> (480, -36) projected
  line L12 (516, -24) -> (480, -24) projected
  line L13 (516, -36) -> (516, -24) projected
  line L14 (552, -36) -> (516, -36) projected
  line L15 (552, -24) -> (552, -36) projected
  line L16 (588, -24) -> (552, -24) projected
  line L17 (588, -36) -> (588, -24) projected
  line L18 (636, -36) -> (588, -36) projected
  line L19 (636, 0) -> (636, -36) projected
  line L20 (624, 0) -> (636, 0) projected
  line L21 (624, 36) -> (624, 0) projected
  line L22 (636, 36) -> (624, 36) projected
  line L23 (636, 72) -> (636, 36) projected
  line L24 (624, 72) -> (636, 72) projected
  line L25 (624, 108) -> (624, 72) projected
  line L26 (636, 108) -> (624, 108) projected
  line L27 (636, 144) -> (636, 108) projected
  line L28 (624, 144) -> (636, 144) projected
  line L29 (624, 152) -> (624, 144) projected
  line L30 (588, 152) -> (624, 152) projected
  line L31 (588, 164) -> (588, 152) projected
  line L32 (552, 164) -> (588, 164) projected
  line L33 (552, 152) -> (552, 164) projected
  line L34 (516, 152) -> (552, 152) projected
  line L35 (516, 164) -> (516, 152) projected
  line L36 (480, 164) -> (516, 164) projected
  line L37 (480, 152) -> (480, 164) projected
  line L38 (444, 152) -> (480, 152) projected
  line L39 (444, 164) -> (444, 152) projected
  line L40 (408, 164) -> (444, 164) projected
  line L41 (408, 152) -> (408, 164) projected
  line L42 (372, 152) -> (408, 152) projected
  line L43 (372, 164) -> (372, 152) projected
  line L44 (336, 164) -> (372, 164) projected
  line L45 (336, 152) -> (336, 164) projected
  line L46 (300, 152) -> (336, 152) projected
  line L47 (300, 164) -> (300, 152) projected
  line L48 (264, 164) -> (300, 164) projected
  line L49 (264, 152) -> (264, 164) projected
  line L50 (228, 152) -> (264, 152) projected
  line L51 (228, 164) -> (228, 152) projected
  line L52 (192, 164) -> (228, 164) projected
  line L53 (192, 152) -> (192, 164) projected
  line L54 (156, 152) -> (192, 152) projected
  line L55 (156, 164) -> (156, 152) projected
  line L56 (120, 164) -> (156, 164) projected
  line L57 (120, 152) -> (120, 164) projected
  line L58 (84, 152) -> (120, 152) projected
  line L59 (84, 164) -> (84, 152) projected
  line L60 (48, 164) -> (84, 164) projected
  line L61 (48, 152) -> (48, 164) projected
  line L62 (12, 152) -> (48, 152) projected
  line L63 (12, 144) -> (12, 152) projected
  line L64 (0, 144) -> (12, 144) projected
  line L65 (0, 108) -> (0, 144) projected
  line L66 (12, 108) -> (0, 108) projected
  line L67 (12, 72) -> (12, 108) projected
  line L68 (0, 72) -> (12, 72) projected
  line L69 (0, 36) -> (0, 72) projected
  line L70 (12, 36) -> (0, 36) projected
  line L71 (12, 0) -> (12, 36) projected
  line L72 (0, 0) -> (12, 0) projected
  line L73 (0, -36) -> (0, 0) projected
  line L74 (48, -36) -> (0, -36) projected
  line L75 (48, -24) -> (48, -36) projected
  line L76 (84, -24) -> (48, -24) projected
  line L77 (84, -36) -> (84, -24) projected
  line L78 (120, -36) -> (84, -36) projected
  line L79 (120, -24) -> (120, -36) projected
  line L80 (156, -24) -> (120, -24) projected
  line L81 (156, -36) -> (156, -24) projected
  circle A2 centre (368, 114) radius 2.5 projected
  circle A3 centre (168, 114) radius 2.5 projected
  circle A4 centre (468, 14) radius 2.5 projected
  circle A5 centre (268, 14) radius 2.5 projected
  circle A6 centre (168, 14) radius 2.5 projected
  circle A7 centre (418, 64) radius 2.5 projected
  circle A8 centre (518, 64) radius 2.5 projected
  circle A9 centre (118, 64) radius 2.5 projected
  circle A10 centre (218, 64) radius 2.5 projected
  circle A11 centre (318, 64) radius 2.5 projected
  circle A12 centre (368, 14) radius 2.5 projected
  circle A13 centre (268, 114) radius 2.5 projected
  circle A14 centre (468, 114) radius 2.5 projected
  point P0 (0, 363.0004)
equation "\"d4\" = 17 * d7"
equation "\"d7\" = 3 * d6"
equation "\"d10\" = d7"
equation "\"d31\" = d24"
equation "\"d32\" = 0.5 * d31"
equation "\"d33\" = d32"
properties part number "wooden_top"
